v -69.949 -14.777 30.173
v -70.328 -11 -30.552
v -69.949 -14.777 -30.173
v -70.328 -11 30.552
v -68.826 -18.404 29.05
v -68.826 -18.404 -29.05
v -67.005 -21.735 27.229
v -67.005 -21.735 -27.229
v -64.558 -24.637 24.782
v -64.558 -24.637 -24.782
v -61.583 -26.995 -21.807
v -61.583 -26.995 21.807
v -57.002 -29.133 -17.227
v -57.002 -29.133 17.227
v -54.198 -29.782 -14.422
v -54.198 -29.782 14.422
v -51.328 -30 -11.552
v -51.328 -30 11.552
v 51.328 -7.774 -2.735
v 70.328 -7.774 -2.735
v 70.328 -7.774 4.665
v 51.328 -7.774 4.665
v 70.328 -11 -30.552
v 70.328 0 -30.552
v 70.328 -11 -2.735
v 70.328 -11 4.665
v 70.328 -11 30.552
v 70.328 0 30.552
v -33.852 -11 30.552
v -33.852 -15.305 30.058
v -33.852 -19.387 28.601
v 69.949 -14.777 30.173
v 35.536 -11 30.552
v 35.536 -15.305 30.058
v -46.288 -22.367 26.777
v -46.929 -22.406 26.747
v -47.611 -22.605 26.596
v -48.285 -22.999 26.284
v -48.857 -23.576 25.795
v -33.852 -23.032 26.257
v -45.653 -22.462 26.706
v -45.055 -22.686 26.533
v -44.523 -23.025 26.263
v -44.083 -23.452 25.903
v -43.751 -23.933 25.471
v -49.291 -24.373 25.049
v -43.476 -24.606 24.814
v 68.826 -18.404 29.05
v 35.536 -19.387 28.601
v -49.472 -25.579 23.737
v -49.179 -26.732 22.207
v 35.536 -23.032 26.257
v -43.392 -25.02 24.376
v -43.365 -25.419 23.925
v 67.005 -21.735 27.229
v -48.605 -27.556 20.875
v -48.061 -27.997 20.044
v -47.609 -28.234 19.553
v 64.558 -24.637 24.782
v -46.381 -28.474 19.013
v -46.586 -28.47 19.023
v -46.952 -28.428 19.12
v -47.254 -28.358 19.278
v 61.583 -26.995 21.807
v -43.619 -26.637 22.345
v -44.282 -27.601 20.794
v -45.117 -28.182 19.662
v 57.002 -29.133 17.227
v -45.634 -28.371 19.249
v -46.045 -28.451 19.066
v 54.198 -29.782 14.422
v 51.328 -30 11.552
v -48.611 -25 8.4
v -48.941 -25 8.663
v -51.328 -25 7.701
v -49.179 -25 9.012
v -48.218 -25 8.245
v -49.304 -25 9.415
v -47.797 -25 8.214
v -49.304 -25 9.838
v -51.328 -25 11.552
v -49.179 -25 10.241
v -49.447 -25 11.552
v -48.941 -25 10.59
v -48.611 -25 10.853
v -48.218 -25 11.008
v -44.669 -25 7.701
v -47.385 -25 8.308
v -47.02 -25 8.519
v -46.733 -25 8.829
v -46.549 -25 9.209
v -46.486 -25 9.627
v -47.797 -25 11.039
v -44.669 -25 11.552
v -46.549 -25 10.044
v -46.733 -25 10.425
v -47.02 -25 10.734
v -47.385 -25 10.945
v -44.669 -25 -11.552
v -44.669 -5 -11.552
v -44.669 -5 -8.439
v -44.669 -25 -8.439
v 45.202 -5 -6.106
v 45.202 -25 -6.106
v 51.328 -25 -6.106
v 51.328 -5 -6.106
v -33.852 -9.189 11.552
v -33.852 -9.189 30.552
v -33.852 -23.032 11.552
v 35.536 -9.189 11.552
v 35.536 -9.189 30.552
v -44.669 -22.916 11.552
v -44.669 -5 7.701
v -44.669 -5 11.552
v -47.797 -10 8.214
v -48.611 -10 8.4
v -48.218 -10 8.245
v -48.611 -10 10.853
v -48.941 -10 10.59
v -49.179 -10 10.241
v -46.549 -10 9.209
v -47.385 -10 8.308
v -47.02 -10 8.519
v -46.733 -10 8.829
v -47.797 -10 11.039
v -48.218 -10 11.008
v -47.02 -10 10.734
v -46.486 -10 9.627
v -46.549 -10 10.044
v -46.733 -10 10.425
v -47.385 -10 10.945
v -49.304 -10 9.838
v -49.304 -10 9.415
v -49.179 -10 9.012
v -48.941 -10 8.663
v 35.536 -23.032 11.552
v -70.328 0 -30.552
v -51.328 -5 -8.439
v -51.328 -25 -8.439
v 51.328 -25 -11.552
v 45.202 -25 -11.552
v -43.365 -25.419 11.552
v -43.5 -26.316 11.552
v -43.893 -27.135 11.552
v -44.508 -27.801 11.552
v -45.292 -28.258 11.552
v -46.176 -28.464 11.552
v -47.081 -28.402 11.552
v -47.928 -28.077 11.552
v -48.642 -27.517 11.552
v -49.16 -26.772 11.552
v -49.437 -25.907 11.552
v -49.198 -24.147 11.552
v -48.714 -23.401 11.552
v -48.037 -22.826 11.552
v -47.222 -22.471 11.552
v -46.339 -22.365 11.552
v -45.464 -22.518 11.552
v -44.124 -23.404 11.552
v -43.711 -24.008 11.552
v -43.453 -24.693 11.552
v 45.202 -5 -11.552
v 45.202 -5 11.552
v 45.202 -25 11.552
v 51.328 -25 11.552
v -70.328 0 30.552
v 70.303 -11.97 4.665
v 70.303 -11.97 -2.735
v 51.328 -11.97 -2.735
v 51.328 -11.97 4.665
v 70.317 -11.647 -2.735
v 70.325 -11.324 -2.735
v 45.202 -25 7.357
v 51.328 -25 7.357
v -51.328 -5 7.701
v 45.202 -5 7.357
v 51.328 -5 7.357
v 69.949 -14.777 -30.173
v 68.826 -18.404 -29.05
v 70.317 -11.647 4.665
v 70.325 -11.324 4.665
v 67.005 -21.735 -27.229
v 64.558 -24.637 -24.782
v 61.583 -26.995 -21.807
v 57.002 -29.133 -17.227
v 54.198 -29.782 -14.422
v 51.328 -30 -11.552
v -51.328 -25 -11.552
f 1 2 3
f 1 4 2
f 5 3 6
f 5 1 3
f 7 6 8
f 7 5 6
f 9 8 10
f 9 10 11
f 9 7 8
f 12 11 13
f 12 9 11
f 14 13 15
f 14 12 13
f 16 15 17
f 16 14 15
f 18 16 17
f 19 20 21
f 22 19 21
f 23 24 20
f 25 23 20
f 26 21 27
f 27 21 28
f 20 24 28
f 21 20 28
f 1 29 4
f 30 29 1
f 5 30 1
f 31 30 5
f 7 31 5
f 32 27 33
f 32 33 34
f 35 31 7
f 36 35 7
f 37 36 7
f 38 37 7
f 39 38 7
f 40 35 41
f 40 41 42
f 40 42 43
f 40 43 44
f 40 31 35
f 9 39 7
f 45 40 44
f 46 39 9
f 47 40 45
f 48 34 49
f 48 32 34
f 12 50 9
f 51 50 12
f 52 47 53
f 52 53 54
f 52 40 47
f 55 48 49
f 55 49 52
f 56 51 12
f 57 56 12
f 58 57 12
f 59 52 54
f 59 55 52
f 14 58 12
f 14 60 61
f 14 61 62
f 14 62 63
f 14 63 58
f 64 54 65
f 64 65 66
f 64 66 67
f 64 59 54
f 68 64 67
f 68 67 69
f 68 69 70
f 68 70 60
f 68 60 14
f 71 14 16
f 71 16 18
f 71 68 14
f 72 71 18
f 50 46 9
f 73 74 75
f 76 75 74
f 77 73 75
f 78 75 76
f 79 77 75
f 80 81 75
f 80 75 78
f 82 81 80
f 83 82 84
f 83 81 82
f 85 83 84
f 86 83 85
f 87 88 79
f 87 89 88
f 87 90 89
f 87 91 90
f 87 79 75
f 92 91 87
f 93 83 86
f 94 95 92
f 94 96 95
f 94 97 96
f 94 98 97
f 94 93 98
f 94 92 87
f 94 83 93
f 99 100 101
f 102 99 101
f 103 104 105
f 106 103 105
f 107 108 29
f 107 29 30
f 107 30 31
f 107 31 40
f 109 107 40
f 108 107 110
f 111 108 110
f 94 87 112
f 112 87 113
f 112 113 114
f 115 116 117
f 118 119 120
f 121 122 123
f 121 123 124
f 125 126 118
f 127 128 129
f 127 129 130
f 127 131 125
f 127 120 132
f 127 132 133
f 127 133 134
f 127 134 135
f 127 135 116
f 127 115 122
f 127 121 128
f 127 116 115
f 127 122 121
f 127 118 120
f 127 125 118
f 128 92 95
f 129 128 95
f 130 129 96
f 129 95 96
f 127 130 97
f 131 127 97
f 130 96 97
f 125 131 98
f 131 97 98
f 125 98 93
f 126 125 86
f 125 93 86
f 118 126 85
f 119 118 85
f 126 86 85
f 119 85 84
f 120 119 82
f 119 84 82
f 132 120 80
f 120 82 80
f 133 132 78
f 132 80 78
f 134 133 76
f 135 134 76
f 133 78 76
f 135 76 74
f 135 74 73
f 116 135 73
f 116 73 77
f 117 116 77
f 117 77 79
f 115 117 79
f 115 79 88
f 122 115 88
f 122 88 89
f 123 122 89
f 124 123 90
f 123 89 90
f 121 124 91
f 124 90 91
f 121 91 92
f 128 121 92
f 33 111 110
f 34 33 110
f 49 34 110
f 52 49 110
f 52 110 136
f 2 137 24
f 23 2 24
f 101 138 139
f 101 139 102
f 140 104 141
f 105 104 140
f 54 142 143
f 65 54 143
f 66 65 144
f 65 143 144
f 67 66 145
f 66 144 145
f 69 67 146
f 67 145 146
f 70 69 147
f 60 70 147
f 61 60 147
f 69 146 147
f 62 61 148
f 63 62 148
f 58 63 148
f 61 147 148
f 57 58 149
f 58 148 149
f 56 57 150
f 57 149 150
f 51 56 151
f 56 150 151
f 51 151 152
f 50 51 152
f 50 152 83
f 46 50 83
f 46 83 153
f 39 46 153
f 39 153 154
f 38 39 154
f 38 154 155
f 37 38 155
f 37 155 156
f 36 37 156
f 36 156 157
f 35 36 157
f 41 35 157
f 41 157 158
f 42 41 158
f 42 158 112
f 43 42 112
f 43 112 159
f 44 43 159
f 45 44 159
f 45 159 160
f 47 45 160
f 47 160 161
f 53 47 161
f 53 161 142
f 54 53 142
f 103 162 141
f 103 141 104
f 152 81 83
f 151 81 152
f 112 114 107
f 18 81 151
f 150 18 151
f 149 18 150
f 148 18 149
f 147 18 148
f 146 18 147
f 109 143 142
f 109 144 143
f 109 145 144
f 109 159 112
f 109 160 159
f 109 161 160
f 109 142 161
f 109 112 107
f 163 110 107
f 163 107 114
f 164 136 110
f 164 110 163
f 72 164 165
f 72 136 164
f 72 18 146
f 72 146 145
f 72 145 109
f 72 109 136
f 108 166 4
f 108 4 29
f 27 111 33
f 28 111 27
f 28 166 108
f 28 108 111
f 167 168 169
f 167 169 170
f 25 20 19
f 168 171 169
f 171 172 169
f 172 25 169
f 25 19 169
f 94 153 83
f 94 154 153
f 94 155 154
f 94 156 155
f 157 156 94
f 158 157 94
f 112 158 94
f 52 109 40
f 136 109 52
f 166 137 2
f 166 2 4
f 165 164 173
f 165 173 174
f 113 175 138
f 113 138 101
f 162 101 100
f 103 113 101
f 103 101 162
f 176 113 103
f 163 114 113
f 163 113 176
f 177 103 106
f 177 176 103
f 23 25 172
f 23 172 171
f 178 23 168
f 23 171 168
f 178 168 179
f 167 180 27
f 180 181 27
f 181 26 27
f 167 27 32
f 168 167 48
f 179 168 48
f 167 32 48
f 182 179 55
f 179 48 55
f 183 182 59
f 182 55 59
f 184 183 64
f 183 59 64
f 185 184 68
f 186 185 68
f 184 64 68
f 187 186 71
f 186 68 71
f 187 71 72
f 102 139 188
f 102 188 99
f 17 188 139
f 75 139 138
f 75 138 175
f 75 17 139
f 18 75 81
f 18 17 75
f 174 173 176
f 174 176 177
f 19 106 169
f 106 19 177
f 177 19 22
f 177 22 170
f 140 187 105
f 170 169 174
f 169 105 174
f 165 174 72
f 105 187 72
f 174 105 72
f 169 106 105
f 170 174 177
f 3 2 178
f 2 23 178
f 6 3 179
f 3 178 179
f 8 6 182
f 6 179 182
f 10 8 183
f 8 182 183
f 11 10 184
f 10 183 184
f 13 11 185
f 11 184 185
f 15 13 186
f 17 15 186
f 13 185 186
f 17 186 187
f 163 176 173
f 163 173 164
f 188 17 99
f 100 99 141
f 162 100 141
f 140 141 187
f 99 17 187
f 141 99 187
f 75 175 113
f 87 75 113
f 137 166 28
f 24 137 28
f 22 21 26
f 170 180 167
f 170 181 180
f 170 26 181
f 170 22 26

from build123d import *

# Parameters (mm, degrees)
F0_W      = 140.6558603048
F0_H      = 61.1045844853
F1_DEPTH  = 30
F2_R      = 19
F3_W      = 102.6558603048
F3_H      = 23.1045844853
F4_DEPTH  = 25
F5_W      = 4.1960617527
F5_H      = 7.4001618195
F6_DEPTH  = 55.3
F7_W      = 69.3877674639
F7_H      = 13.8425575569
F8_DEPTH  = 54.5
F9_R      = 3.055172352
F10_DEPTH = 61.9
F11_W     = 6.6588682532
F11_H     = 3.1128286794
F11_H_2   = 3.8515164927
F11_W_2   = 6.1259952784
F11_H_3   = 4.1949943118
F11_H_4   = 5.4464771822
F12_DEPTH = 20
F13_R     = 1.4165828047
F14_DEPTH = 15


with BuildPart() as f1:
    # F0 (on Front) → F1 (new body)
    with BuildSketch(Plane.XZ):
        Rectangle(F0_W, F0_H)
    extrude(amount=F1_DEPTH)

    # F2
    f2_edges = [f1.edges().sort_by_distance(p)[0] for p in [
        (0, -30, 30.552292),
        (-70.32793, -30, 0),
        (0, -30, -30.552292),
        (70.32793, -30, 0),
    ]]
    fillet(f2_edges, radius=F2_R)

    # F3 (on face) → F4 (cut)
    with BuildSketch(Plane.XZ.offset(30)):
        Rectangle(F3_W, F3_H)
    extrude(amount=-F4_DEPTH, mode=Mode.SUBTRACT)

    # F5 (on face) → F6 (cut)
    with BuildSketch(Plane(origin=(51.3279301524, 0, 0), x_dir=(0, -1, 0), z_dir=(-1, 0, 0))):
        with Locations((9.8722497933, 0.9650638094)):
            Rectangle(F5_W, F5_H)
    extrude(amount=-F6_DEPTH, mode=Mode.SUBTRACT)

    # F7 (on face) → F8 (cut)
    with BuildSketch(Plane(origin=(0, 0, 11.5522922426), x_dir=(1, 0, 0), z_dir=(0, 0, -1))):
        with Locations((0.842327252, 16.1106861196)):
            Rectangle(F7_W, F7_H)
    extrude(amount=-F8_DEPTH, mode=Mode.SUBTRACT)

    # F9 (on face) → F10 (cut)
    with BuildSketch(Plane(origin=(0, 0, 11.5522922426), x_dir=(1, 0, 0), z_dir=(0, 0, -1))):
        with Locations((-46.420622617, 25.4190824926)):
            Circle(F9_R)
    extrude(amount=-F10_DEPTH, mode=Mode.SUBTRACT)

    # F11 (on face) → F12 (join)
    with BuildSketch(Plane.XZ.offset(5)):
        with Locations((-47.9984960258, -9.995877903)):
            Rectangle(F11_W, F11_H)
        with Locations((-47.9984960258, 9.6265339963)):
            Rectangle(F11_W, F11_H_2)
        with Locations((48.2649325132, 9.4547950868)):
            Rectangle(F11_W_2, F11_H_3)
        with Locations((48.2649325132, -8.8290536515)):
            Rectangle(F11_W_2, F11_H_4)
    extrude(amount=F12_DEPTH)

    # F13 (on face) → F14 (cut)
    with BuildSketch(Plane.XZ.offset(25)):
        with Locations((-47.9030236602, 9.6265339963)):
            Circle(F13_R)
    extrude(amount=-F14_DEPTH, mode=Mode.SUBTRACT)


solid = f1.part
